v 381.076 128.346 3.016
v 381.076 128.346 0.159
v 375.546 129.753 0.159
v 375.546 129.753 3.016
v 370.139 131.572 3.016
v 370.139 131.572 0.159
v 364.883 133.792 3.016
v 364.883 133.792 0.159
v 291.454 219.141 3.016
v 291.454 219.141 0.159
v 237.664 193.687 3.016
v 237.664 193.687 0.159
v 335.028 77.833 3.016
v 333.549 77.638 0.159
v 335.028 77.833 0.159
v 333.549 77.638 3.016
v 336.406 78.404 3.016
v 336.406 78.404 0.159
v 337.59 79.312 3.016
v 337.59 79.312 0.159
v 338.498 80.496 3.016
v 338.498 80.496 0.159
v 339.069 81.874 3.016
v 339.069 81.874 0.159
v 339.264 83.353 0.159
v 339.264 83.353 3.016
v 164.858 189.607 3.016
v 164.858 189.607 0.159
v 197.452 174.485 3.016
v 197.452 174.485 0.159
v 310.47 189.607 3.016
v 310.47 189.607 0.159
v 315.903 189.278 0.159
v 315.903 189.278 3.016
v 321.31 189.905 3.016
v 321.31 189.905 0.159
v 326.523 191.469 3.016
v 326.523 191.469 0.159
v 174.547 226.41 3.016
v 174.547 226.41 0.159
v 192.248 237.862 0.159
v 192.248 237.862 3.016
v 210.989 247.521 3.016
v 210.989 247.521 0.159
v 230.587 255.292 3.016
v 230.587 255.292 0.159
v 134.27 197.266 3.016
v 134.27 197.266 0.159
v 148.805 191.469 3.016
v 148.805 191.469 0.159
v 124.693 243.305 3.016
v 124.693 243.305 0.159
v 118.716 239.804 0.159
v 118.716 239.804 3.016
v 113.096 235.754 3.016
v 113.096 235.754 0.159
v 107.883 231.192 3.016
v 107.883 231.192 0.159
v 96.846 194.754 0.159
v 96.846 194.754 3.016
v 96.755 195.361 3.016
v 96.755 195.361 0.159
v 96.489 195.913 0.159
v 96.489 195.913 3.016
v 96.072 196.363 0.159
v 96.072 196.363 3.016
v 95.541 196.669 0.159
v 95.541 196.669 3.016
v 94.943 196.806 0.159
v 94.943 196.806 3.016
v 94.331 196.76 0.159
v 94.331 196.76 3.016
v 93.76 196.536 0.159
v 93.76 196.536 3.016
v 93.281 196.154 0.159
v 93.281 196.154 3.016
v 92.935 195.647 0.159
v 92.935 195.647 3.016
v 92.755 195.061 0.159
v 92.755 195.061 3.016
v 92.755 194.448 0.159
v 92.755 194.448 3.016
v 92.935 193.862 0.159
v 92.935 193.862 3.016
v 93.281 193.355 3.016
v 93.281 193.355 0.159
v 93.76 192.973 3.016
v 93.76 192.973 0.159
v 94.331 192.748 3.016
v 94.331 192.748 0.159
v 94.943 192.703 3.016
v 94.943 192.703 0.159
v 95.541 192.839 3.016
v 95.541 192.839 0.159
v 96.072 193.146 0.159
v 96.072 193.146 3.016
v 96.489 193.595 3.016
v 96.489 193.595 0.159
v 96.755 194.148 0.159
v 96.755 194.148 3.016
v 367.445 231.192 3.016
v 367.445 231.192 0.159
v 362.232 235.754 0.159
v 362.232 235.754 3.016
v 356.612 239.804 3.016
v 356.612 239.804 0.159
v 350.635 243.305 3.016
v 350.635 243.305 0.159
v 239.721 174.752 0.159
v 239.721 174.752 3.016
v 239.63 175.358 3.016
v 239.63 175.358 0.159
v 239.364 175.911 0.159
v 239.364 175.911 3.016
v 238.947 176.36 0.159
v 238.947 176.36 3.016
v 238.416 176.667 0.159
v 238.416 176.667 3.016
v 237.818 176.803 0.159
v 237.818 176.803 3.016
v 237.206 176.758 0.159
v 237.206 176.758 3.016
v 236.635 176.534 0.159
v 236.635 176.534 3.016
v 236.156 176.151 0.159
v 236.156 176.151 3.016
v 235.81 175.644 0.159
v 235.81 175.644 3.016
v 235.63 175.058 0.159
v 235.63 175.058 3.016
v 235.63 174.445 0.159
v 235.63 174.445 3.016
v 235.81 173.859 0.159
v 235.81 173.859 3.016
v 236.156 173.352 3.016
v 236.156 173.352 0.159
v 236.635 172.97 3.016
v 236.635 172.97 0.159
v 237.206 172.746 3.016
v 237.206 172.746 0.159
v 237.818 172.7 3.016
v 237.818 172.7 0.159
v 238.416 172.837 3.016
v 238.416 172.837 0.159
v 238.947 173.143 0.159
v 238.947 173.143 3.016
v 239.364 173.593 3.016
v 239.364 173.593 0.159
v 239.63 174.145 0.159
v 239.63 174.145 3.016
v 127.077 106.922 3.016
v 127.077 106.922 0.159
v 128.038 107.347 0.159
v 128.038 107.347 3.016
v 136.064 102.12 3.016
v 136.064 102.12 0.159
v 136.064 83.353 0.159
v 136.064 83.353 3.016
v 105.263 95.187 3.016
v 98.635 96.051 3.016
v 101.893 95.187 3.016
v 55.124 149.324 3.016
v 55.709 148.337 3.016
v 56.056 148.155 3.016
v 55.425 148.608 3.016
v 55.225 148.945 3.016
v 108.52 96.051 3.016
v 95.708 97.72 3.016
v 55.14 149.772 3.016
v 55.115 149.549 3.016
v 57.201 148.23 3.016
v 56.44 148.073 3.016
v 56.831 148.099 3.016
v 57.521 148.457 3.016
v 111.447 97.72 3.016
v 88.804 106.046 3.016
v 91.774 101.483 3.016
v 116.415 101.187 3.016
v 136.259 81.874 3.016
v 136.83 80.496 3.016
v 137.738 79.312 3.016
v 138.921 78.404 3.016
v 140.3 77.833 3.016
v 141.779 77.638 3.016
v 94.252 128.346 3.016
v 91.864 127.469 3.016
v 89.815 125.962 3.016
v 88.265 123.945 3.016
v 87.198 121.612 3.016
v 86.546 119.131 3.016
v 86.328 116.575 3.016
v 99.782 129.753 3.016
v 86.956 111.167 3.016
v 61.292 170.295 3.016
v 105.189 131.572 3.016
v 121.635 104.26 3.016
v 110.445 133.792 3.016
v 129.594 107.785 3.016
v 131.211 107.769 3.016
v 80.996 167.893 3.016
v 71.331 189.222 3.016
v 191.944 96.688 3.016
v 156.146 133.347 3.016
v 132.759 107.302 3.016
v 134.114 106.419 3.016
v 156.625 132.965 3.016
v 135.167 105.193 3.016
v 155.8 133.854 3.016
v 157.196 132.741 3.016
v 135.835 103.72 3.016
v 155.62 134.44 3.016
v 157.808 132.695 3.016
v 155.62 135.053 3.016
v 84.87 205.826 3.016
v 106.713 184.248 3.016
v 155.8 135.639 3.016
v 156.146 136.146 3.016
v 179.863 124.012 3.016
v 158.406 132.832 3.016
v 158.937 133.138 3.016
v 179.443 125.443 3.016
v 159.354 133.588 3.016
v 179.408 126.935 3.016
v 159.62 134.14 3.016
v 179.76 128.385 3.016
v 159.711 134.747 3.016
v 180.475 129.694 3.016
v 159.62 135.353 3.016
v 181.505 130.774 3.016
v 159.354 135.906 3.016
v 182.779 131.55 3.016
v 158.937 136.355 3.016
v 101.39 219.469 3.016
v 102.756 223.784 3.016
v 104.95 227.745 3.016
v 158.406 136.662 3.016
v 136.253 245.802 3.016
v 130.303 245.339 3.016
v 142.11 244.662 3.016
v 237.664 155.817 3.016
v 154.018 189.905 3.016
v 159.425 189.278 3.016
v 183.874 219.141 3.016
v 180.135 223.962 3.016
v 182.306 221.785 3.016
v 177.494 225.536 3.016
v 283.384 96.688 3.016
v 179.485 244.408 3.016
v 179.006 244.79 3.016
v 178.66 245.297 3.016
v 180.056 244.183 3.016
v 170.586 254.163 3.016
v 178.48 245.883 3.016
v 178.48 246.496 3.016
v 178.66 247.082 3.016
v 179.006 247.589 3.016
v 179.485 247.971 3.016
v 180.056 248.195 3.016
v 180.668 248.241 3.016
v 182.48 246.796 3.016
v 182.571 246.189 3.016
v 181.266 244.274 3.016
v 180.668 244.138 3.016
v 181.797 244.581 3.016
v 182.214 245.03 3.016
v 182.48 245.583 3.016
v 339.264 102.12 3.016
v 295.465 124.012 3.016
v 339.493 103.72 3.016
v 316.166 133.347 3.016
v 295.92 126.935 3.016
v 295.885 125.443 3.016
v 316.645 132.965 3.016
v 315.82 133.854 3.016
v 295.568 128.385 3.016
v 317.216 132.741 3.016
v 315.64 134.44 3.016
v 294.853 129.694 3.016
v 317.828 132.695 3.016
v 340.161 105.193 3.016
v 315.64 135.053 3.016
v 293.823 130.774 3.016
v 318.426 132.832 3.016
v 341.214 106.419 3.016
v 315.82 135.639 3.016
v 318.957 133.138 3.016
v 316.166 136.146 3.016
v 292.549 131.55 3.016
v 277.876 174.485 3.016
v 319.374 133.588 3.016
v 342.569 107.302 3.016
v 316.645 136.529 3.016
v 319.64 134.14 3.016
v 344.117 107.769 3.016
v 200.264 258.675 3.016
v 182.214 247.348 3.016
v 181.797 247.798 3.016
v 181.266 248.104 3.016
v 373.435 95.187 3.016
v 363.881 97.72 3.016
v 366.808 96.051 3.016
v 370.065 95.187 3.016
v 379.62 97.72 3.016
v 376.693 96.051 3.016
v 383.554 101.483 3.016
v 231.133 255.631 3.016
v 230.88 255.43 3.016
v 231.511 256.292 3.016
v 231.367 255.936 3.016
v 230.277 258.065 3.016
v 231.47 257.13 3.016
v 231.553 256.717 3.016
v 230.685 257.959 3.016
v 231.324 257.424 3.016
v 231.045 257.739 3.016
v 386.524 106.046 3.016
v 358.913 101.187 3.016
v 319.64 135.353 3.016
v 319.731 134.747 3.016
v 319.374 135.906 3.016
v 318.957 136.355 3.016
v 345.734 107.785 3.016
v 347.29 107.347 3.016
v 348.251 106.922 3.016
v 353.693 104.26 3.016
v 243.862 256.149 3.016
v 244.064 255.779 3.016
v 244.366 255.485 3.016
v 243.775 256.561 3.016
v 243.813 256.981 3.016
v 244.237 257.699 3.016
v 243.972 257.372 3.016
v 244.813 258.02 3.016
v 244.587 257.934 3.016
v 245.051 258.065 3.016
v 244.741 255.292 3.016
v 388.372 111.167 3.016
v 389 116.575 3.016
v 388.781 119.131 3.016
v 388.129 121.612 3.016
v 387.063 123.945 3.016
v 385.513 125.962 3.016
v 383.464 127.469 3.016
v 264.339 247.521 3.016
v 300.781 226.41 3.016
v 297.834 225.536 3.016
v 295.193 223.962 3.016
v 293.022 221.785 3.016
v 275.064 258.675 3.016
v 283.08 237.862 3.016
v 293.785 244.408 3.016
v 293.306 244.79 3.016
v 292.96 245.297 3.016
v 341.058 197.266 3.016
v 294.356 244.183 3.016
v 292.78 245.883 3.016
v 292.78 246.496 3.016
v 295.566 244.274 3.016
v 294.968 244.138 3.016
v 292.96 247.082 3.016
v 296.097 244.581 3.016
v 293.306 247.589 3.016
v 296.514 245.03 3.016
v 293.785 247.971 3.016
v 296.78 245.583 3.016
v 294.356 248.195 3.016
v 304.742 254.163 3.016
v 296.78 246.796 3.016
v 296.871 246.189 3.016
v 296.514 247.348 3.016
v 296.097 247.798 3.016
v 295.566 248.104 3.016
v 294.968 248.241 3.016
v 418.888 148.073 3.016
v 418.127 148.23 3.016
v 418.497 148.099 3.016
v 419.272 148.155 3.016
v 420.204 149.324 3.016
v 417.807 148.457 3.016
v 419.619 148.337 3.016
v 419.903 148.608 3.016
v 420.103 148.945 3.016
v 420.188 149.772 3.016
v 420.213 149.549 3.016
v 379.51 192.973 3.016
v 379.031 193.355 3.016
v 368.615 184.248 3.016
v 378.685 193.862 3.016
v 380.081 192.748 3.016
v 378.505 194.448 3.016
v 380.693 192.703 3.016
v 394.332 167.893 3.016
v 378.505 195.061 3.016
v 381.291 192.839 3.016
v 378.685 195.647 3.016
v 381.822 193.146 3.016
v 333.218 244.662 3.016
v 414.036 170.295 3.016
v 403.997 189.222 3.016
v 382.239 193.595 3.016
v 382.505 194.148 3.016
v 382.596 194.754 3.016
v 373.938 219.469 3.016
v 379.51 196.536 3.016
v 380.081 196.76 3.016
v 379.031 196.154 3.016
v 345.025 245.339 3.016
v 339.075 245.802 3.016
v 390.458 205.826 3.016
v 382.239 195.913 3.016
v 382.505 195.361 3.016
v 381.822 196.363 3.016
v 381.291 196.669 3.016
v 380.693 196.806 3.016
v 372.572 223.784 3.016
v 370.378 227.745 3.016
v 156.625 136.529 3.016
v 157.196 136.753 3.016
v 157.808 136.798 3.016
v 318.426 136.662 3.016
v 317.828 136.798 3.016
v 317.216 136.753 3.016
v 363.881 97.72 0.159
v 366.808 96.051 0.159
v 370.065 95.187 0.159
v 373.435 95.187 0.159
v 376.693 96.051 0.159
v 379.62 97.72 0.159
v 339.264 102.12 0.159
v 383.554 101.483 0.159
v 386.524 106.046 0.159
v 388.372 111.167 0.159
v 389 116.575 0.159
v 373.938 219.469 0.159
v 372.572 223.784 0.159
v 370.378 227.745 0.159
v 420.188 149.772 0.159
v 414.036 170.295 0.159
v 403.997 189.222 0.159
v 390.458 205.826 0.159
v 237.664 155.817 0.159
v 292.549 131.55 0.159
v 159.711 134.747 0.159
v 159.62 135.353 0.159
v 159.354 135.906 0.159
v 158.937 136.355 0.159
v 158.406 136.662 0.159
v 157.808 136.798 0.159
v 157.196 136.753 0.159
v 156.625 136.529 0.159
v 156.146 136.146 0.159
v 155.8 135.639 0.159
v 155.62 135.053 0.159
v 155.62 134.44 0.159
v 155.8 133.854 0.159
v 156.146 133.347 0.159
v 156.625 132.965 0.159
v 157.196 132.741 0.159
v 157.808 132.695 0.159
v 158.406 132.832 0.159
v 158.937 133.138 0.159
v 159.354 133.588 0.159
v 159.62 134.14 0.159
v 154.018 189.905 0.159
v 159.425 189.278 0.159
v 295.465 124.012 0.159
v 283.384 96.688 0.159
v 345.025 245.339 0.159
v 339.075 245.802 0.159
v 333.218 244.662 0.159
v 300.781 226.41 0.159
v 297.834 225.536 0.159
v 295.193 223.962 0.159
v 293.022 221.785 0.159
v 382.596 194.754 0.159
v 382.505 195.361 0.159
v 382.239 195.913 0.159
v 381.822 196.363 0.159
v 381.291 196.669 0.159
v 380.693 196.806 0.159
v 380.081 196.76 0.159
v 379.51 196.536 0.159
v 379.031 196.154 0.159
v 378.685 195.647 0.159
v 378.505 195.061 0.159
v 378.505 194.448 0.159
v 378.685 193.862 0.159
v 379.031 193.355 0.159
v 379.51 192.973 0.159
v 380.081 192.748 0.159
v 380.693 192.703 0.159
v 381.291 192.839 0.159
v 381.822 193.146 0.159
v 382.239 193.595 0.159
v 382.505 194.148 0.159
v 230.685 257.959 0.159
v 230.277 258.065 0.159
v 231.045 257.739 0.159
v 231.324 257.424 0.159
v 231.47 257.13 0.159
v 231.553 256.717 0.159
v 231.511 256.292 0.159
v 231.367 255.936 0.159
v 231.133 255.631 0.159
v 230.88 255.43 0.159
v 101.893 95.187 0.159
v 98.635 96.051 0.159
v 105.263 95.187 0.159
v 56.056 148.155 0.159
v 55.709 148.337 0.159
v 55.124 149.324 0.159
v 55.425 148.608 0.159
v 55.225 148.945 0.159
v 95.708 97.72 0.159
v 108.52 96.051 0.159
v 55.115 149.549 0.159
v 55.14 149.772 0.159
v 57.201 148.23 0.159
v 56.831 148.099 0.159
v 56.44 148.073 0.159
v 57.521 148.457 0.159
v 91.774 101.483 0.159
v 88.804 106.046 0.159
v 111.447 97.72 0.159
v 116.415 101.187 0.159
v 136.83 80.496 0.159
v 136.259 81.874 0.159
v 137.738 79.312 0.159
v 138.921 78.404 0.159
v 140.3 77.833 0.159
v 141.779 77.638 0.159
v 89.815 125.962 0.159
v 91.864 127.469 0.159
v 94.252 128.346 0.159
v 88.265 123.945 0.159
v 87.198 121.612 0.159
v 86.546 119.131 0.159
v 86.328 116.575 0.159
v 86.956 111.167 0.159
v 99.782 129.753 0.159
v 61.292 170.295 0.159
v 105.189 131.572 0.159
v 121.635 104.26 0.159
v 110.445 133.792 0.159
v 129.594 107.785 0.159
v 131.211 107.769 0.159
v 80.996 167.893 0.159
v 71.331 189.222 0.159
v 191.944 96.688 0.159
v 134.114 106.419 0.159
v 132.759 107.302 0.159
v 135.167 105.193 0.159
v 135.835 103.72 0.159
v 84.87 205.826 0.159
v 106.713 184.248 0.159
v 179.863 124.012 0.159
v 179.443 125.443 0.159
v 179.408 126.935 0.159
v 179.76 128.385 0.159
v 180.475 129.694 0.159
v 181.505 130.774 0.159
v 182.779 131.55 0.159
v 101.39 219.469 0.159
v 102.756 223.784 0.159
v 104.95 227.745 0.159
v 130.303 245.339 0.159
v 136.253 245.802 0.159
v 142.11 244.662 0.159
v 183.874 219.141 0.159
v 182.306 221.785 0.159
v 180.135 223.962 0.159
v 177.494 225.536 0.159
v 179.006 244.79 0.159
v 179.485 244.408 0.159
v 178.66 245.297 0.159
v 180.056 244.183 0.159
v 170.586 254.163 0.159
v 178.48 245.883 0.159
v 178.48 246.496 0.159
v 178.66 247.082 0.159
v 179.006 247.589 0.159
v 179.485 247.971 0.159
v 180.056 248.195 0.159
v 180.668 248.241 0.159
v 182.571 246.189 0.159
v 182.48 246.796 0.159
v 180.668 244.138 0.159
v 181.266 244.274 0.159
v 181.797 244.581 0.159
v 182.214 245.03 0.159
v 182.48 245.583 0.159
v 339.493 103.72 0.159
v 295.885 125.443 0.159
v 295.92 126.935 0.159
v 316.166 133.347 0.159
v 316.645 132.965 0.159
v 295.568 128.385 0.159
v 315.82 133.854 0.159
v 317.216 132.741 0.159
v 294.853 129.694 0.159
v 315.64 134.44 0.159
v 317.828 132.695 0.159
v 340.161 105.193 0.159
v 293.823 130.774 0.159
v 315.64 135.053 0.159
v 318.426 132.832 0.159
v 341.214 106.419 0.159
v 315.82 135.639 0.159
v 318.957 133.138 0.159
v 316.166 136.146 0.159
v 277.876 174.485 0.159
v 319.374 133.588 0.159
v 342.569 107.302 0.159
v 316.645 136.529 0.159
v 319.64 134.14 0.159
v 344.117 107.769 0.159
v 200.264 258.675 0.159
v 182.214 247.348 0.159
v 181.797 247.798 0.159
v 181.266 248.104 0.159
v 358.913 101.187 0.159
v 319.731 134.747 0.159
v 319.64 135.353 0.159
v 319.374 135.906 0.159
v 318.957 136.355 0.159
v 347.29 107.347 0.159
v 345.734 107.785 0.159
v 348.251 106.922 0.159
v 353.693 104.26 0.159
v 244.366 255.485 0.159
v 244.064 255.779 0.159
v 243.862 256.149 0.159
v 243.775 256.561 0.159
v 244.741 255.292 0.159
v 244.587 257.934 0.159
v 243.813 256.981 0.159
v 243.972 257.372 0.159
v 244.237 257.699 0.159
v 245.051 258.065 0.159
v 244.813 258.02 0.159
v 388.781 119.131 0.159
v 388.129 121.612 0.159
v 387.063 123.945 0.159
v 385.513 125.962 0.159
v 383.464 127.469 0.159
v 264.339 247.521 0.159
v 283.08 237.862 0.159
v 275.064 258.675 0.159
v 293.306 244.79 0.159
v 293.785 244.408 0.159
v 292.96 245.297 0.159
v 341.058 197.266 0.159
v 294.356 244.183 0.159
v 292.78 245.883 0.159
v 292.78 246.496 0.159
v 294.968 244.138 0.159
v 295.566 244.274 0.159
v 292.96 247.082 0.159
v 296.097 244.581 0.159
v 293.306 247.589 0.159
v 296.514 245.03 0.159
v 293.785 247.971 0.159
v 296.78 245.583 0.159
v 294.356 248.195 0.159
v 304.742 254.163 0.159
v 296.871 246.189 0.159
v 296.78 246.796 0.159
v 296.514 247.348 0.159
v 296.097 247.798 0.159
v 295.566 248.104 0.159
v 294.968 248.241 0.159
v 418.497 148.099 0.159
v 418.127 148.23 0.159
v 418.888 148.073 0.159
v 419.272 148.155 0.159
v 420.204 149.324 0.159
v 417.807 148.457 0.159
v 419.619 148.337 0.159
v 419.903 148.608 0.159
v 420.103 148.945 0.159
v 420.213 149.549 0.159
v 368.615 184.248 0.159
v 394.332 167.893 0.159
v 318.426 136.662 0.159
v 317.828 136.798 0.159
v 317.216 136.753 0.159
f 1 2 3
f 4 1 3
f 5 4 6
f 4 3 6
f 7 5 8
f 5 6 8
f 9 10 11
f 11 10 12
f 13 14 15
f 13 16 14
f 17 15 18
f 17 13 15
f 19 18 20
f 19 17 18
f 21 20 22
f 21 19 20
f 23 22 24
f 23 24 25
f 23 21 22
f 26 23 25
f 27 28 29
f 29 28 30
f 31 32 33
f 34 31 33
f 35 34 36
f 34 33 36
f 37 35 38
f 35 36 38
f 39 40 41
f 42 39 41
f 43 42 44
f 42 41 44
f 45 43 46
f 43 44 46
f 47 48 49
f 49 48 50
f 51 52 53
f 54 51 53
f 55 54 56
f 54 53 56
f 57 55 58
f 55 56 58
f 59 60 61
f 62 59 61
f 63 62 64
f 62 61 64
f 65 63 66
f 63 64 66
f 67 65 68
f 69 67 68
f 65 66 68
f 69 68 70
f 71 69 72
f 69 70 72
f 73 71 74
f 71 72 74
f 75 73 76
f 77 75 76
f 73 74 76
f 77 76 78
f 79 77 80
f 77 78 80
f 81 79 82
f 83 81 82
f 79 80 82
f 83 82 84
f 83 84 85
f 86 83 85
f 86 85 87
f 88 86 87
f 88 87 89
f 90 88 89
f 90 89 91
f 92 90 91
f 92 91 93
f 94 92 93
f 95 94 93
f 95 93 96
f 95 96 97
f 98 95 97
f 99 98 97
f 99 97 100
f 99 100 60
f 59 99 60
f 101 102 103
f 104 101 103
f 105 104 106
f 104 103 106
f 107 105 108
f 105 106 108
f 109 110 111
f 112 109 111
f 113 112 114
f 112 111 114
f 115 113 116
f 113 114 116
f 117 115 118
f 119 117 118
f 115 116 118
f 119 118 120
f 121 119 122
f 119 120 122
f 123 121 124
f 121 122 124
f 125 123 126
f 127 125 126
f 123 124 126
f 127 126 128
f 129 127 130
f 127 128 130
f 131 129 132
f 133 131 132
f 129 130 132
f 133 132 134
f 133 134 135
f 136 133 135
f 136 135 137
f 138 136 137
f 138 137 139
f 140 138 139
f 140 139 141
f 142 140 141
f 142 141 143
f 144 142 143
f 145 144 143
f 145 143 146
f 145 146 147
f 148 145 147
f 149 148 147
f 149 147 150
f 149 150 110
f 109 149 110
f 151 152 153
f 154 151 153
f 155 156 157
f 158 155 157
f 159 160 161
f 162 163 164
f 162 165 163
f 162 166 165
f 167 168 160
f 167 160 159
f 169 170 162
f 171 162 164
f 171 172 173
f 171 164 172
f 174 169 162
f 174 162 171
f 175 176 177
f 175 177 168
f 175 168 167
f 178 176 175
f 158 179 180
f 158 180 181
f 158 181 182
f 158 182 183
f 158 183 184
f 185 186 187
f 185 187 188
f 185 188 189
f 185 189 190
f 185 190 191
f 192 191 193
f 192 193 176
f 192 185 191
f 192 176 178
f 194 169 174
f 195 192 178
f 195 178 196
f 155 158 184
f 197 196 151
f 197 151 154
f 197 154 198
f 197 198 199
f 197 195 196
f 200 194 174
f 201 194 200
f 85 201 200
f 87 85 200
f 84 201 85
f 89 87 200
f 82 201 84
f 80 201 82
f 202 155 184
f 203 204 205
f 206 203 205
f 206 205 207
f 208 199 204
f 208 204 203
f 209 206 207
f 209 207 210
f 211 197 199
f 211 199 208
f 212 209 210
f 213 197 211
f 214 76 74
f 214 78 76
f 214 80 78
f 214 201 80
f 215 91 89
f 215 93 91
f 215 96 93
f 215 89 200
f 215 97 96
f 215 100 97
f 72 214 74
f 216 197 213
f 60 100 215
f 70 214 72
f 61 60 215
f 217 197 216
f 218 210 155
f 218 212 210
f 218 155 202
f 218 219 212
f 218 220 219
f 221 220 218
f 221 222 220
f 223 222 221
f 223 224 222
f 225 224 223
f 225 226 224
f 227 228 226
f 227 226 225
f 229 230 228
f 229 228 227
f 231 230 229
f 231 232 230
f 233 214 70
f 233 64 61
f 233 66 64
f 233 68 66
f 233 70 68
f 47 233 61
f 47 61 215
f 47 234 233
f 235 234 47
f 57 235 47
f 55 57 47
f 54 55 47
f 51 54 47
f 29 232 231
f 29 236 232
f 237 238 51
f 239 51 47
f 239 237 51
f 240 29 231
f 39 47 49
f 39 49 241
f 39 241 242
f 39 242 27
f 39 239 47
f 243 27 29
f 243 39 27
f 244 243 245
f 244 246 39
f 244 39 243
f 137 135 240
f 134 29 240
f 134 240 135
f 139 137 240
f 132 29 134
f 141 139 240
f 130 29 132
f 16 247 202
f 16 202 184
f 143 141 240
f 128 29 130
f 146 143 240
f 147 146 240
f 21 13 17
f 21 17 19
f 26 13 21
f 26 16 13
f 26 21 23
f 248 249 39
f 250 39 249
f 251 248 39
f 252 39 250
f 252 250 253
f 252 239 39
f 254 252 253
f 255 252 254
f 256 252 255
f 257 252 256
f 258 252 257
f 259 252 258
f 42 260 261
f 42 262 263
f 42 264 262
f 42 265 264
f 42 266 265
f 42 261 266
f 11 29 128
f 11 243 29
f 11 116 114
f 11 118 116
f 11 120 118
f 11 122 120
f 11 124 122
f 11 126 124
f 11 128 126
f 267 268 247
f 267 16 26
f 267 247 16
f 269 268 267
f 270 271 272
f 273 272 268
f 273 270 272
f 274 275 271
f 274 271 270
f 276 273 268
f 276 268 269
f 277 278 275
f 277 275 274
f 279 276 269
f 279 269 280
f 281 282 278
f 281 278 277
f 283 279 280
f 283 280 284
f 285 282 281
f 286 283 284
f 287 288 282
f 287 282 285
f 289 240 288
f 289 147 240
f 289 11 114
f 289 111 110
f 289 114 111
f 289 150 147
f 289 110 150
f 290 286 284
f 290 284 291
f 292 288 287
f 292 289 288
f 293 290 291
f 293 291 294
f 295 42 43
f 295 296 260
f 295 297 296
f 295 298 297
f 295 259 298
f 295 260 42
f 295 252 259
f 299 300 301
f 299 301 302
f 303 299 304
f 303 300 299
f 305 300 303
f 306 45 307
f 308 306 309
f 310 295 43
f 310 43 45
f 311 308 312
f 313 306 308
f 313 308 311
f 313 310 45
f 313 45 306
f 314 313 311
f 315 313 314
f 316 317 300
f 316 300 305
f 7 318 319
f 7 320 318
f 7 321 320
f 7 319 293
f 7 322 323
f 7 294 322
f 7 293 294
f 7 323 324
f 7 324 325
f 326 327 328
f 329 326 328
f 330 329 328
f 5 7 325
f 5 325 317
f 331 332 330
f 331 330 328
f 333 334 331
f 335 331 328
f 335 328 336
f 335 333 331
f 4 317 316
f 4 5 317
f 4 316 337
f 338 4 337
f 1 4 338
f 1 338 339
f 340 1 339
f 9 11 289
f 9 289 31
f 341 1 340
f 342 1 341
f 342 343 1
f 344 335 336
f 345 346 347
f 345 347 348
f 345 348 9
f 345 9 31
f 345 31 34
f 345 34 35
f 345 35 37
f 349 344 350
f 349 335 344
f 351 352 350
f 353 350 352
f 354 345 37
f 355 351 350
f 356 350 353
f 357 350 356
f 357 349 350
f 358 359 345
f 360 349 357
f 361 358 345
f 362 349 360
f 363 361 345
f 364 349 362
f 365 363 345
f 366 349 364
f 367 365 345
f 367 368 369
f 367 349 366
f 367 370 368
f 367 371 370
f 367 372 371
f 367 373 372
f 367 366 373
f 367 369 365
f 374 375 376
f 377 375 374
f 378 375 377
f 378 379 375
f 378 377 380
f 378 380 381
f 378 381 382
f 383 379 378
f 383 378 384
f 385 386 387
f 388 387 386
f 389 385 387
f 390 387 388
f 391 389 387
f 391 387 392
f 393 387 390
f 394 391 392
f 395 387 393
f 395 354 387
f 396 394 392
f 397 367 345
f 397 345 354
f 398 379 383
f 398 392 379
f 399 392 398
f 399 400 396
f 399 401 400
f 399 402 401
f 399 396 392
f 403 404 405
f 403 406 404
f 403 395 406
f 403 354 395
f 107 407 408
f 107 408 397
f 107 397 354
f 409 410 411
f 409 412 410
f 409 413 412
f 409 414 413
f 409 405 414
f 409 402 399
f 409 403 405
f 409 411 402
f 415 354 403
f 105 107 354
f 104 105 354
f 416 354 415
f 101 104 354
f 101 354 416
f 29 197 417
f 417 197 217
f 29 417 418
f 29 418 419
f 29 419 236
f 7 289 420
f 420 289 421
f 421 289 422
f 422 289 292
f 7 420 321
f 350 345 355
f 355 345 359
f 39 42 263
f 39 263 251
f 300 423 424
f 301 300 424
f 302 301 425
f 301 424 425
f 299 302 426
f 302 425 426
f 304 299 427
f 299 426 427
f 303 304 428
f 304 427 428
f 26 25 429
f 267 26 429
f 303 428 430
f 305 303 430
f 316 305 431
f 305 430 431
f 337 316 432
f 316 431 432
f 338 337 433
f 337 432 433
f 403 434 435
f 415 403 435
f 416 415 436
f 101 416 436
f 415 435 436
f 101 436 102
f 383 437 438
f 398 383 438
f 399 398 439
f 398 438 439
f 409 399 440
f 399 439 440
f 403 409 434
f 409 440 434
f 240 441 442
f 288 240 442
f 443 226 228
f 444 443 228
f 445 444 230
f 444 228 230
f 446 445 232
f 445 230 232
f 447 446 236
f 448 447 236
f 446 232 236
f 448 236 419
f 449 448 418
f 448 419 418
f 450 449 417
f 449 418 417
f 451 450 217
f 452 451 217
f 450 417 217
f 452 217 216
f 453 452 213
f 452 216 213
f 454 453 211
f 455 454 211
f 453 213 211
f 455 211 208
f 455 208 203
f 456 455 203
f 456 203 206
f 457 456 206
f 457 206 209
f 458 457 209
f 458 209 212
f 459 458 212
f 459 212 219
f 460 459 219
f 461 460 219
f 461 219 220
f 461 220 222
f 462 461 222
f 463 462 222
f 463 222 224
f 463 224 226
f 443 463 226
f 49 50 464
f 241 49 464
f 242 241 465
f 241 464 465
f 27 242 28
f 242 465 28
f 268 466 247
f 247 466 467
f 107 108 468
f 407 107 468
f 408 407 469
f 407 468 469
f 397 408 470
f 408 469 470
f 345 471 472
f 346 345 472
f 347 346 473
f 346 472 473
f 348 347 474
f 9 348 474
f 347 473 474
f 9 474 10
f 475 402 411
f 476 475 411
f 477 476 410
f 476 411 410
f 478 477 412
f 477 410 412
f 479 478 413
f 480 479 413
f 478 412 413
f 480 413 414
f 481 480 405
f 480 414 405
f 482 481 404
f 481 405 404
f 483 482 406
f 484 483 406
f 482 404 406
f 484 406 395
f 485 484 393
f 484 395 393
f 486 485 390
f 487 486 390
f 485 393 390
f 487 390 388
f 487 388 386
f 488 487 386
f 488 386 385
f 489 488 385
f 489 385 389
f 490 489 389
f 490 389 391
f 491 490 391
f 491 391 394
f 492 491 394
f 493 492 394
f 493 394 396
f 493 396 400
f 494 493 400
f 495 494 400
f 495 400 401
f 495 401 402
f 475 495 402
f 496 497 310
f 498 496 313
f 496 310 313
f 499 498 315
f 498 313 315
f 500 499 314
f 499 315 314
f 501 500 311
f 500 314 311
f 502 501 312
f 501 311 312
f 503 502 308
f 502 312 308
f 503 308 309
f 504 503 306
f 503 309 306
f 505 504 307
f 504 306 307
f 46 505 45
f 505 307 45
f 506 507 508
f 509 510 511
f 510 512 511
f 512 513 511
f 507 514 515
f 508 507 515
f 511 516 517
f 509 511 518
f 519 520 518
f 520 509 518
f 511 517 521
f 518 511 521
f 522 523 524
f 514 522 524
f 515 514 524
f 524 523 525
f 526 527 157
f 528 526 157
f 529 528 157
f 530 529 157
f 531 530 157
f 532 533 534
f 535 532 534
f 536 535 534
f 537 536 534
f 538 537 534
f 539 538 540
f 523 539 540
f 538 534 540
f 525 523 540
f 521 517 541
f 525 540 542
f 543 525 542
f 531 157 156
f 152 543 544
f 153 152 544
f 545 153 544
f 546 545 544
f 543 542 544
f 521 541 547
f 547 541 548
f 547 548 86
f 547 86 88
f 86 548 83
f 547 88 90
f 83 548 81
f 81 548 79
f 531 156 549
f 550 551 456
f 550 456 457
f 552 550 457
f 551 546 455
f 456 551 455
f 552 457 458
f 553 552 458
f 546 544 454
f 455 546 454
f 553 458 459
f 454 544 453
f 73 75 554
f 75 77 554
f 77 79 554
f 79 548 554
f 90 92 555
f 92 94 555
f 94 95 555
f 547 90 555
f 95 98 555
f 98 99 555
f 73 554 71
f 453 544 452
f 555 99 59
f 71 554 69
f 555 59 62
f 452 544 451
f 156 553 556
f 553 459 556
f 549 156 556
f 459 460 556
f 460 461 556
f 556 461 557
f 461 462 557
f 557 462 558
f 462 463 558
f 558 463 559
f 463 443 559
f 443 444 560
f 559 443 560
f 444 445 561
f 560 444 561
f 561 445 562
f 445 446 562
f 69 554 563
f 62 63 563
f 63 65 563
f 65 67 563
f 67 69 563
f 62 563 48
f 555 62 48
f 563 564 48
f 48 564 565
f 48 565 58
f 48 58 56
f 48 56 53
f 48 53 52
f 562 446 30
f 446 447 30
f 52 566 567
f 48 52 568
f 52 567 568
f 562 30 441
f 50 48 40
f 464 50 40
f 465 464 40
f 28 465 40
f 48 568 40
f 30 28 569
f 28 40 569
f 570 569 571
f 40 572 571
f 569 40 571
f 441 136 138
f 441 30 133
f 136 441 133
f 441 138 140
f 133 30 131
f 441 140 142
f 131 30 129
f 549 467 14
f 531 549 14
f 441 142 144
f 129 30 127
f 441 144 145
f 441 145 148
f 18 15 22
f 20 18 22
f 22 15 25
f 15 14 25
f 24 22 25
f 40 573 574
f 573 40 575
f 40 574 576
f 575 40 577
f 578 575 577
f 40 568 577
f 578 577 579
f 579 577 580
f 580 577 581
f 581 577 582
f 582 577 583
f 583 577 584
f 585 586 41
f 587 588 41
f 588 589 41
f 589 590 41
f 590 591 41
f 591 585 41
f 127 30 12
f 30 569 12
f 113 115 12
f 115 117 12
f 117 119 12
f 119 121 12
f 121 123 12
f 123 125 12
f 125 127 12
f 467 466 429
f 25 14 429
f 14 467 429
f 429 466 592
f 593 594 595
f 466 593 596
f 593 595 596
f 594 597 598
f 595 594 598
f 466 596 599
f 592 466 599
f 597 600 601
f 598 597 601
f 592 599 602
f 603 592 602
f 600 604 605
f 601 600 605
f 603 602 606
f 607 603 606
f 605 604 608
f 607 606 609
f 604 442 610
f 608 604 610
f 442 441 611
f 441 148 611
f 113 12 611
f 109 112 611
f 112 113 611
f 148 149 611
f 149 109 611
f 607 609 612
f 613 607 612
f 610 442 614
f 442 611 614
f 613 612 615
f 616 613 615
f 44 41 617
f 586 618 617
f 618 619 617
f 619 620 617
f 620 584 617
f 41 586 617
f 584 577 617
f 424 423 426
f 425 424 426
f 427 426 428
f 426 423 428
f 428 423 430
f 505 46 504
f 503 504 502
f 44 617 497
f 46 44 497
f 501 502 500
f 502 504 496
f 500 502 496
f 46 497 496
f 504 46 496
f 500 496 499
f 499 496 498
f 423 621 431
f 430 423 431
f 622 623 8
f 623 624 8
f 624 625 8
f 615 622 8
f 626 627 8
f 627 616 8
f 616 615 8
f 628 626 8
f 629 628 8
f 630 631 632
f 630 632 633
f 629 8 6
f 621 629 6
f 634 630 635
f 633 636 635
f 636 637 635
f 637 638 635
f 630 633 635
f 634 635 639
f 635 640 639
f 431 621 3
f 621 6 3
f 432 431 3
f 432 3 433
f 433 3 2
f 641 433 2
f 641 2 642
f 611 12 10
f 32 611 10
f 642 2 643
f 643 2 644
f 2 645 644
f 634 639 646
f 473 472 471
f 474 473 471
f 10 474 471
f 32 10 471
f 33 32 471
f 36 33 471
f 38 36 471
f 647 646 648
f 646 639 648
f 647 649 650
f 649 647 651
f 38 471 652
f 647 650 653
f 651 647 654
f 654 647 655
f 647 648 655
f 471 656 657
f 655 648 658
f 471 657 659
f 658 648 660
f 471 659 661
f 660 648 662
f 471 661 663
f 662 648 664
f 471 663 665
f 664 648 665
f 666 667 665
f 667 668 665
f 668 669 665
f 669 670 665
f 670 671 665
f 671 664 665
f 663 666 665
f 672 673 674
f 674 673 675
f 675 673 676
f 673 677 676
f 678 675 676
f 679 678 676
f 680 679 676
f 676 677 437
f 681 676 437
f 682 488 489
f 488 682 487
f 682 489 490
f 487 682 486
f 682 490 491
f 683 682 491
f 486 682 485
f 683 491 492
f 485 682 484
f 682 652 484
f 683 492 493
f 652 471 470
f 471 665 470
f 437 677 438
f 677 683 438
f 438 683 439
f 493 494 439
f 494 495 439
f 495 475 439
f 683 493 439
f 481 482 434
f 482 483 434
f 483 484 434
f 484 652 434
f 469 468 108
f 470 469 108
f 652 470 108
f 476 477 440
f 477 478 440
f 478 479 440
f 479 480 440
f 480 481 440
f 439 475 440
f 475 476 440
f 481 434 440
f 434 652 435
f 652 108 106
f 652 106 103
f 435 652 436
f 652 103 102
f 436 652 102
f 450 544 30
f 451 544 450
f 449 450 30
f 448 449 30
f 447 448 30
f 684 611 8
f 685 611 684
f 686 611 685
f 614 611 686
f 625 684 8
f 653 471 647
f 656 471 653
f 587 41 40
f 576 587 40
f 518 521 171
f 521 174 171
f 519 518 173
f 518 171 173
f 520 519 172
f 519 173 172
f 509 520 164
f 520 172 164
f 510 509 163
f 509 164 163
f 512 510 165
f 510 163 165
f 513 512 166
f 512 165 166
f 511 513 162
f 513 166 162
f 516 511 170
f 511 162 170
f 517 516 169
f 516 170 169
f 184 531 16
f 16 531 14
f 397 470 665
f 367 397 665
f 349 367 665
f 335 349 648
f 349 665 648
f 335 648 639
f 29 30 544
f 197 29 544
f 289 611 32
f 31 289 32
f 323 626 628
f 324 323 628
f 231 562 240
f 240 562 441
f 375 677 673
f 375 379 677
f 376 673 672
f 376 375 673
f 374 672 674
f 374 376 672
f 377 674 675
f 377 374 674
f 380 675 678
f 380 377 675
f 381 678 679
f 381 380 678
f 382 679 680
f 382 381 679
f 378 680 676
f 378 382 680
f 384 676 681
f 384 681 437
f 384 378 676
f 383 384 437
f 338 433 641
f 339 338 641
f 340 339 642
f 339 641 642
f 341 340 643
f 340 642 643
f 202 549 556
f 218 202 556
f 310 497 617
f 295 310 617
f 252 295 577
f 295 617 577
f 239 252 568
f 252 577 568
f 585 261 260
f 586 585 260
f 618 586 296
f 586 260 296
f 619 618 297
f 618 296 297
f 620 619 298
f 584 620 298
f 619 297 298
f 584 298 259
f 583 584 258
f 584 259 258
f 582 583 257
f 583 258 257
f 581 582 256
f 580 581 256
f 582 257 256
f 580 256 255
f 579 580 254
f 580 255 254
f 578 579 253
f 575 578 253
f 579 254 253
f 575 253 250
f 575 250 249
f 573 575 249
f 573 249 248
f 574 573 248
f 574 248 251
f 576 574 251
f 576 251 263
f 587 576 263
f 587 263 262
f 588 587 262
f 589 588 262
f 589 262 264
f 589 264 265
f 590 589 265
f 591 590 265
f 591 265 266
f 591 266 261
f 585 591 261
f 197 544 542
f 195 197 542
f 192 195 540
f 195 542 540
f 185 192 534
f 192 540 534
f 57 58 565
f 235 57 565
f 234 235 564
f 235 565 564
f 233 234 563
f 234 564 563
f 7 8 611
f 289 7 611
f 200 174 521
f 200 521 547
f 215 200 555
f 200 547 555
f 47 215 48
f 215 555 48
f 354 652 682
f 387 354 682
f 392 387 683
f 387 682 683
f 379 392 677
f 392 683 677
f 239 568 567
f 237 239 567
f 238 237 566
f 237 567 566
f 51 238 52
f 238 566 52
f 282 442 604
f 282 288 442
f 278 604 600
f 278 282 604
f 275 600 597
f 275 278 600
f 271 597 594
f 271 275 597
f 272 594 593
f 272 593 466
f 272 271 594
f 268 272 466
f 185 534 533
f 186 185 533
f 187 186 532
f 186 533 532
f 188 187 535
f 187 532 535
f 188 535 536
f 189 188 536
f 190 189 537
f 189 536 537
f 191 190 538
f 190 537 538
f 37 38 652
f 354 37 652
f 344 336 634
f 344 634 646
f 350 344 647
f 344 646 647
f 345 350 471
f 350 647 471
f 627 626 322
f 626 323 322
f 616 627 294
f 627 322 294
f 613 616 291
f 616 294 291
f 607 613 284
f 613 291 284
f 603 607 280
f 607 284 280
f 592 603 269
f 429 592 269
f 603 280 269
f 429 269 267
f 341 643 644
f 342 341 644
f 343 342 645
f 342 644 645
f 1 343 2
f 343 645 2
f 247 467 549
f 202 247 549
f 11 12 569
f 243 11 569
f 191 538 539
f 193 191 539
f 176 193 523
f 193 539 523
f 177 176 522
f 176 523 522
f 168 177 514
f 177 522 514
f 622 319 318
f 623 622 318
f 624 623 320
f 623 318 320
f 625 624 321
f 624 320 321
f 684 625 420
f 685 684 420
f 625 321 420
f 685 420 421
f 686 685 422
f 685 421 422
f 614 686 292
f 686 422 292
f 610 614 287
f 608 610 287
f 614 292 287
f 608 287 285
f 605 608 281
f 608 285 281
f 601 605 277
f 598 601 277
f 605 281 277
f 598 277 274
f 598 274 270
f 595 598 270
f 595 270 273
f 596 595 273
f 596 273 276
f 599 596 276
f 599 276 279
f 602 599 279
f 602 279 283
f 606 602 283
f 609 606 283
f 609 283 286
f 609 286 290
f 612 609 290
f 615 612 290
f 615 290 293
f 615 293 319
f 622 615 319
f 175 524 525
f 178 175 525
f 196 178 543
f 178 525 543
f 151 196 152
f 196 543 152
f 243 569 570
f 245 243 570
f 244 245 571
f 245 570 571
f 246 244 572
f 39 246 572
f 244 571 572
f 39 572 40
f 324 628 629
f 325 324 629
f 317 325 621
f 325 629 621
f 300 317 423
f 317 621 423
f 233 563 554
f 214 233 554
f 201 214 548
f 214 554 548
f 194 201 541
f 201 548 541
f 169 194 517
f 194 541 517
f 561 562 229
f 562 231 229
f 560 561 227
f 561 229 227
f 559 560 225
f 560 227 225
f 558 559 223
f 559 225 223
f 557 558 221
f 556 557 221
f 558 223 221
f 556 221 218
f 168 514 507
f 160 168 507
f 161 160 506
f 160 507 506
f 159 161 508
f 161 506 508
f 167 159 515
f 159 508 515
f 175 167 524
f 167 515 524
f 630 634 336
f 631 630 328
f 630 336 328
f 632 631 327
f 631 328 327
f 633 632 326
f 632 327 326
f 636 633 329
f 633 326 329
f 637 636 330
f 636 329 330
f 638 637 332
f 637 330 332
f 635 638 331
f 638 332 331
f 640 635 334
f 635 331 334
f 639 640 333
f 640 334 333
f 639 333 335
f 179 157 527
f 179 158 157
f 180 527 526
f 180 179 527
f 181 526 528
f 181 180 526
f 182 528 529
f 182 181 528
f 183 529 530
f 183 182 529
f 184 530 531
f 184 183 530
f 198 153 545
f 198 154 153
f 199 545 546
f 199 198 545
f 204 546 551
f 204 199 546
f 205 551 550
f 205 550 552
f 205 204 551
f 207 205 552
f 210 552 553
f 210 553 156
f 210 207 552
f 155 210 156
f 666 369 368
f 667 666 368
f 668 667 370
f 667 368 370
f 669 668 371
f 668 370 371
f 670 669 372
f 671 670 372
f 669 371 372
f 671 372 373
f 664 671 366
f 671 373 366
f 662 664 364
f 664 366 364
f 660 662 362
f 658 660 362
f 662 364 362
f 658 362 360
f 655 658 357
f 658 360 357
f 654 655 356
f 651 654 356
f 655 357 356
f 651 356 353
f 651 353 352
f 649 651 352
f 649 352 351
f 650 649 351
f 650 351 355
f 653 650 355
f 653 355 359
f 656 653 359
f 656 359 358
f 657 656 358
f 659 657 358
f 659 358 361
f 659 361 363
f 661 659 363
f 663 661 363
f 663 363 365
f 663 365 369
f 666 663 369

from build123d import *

# Parameters (mm, degrees)
BOSS_EXTRUDE1_DEPTH = 3.175
BOSS_EXTRUDE2_DEPTH = 3.175
FILLET1_R           = 6.35
SKETCH3_R           = 2.286
CUT_EXTRUDE1_DEPTH  = 518.046822543
FILLET2_R           = 1.5875
SCALE4_SCALE        = 0.9


with BuildPart() as part:
    # Sketch1 → Boss-Extrude1 (new body)
    with BuildSketch(Plane.XY):
        with BuildLine():
            Line((192.983759728, 175.441215803), (96.309561297, 130.227436844))
            ThreePointArc((96.309561297, 130.227436844), (87.484677999, 126.692854878), (78.317465574, 124.176100766))
            ThreePointArc((78.317465574, 124.176100766), (74.466708454, 122.444126875), (71.664680309, 119.285535064))
            ThreePointArc((71.664680309, 119.285535064), (70.058699462, 115.330377605), (69.512486748, 111.096691661))
            ThreePointArc((69.512486748, 111.096691661), (72.264254662, 99.39829615), (79.935173725, 90.147259184))
            ThreePointArc((79.935173725, 90.147259184), (88.679137799, 87.2113543), (97.423101873, 90.147259184))
            ThreePointArc((97.423101873, 90.147259184), (105.809954176, 95.76246485), (114.789367372, 100.371148488))
            Line((114.789367372, 100.371148488), (237.663968602, 154.698817321))
            Line((237.663968602, 154.698817321), (360.538569833, 100.371148488))
            ThreePointArc((360.538569833, 100.371148488), (369.517983029, 95.76246485), (377.904835332, 90.147259184))
            ThreePointArc((377.904835332, 90.147259184), (386.648799405, 87.2113543), (395.392763479, 90.147259184))
            ThreePointArc((395.392763479, 90.147259184), (403.063682542, 99.39829615), (405.815450457, 111.096691661))
            ThreePointArc((405.815450457, 111.096691661), (405.269237742, 115.330377605), (403.663256896, 119.285535064))
            ThreePointArc((403.663256896, 119.285535064), (400.86122875, 122.444126875), (397.01047163, 124.176100766))
            ThreePointArc((397.01047163, 124.176100766), (387.843259205, 126.692854878), (379.018375907, 130.227436844))
            Line((379.018375907, 130.227436844), (282.344177476, 175.441215803))
            Line((282.344177476, 175.441215803), (318.55970852, 192.243538611))
            ThreePointArc((318.55970852, 192.243538611), (327.615304884, 192.094216272), (336.396188974, 194.312818822))
            Line((336.396188974, 194.312818822), (352.546314681, 200.753440043))
            ThreePointArc((352.546314681, 200.753440043), (399.763650832, 176.34843342), (441.305300897, 143.191646915))
            ThreePointArc((441.305300897, 143.191646915), (423.803151272, 189.77617727), (389.079447428, 225.423170147))
            ThreePointArc((389.079447428, 225.423170147), (386.452648862, 232.479391977), (381.864833782, 238.449508393))
            ThreePointArc((381.864833782, 238.449508393), (373.00378877, 245.841981415), (363.187253088, 251.908479853))
            ThreePointArc((363.187253088, 251.908479853), (353.665803765, 254.648371797), (343.834991341, 253.415435392))
            ThreePointArc((343.834991341, 253.415435392), (292.266671735, 267.690958579), (238.759580195, 267.420211094))
            ThreePointArc((238.759580195, 267.420211094), (274.672718132, 253.0886387), (307.794144835, 233.135730718))
            ThreePointArc((307.794144835, 233.135730718), (301.585446406, 230.415438718), (297.431026809, 225.059253268))
            Line((297.431026809, 225.059253268), (237.663968602, 196.776891326))
            Line((237.663968602, 196.776891326), (177.896910395, 225.059253268))
            ThreePointArc((177.896910395, 225.059253268), (173.742490798, 230.415438718), (167.533792369, 233.135730718))
            ThreePointArc((167.533792369, 233.135730718), (200.655219072, 253.0886387), (236.568357009, 267.420211094))
            ThreePointArc((236.568357009, 267.420211094), (183.061265469, 267.690958579), (131.492945863, 253.415435392))
            ThreePointArc((131.492945863, 253.415435392), (121.66213344, 254.648371797), (112.140684116, 251.908479853))
            ThreePointArc((112.140684116, 251.908479853), (102.324148434, 245.841981415), (93.463103422, 238.449508393))
            ThreePointArc((93.463103422, 238.449508393), (88.875288342, 232.479391977), (86.248489776, 225.423170147))
            ThreePointArc((86.248489776, 225.423170147), (51.524785932, 189.77617727), (34.022636308, 143.191646915))
            ThreePointArc((34.022636308, 143.191646915), (75.564286372, 176.34843342), (122.781622523, 200.753440043))
            Line((122.781622523, 200.753440043), (138.931748231, 194.312818822))
            ThreePointArc((138.931748231, 194.312818822), (147.712632321, 192.094216272), (156.768228685, 192.243538611))
            Line((156.768228685, 192.243538611), (192.983759728, 175.441215803))
        make_face()
    extrude(amount=BOSS_EXTRUDE1_DEPTH)

    # Sketch2 → Boss-Extrude2 (add)
    with BuildSketch(Plane.XY):
        Polygon((124.775079826, 104.786222668), (124.775079826, 67.83365331), (350.552857378, 67.83365331), (350.552857378, 104.786222668), (304.455055516, 125.167864508), (288.463968602, 89.00031913), (186.863968602, 89.00031913), (170.872881688, 125.167864508), align=None)
    extrude(amount=BOSS_EXTRUDE2_DEPTH)

    # Fillet1
    fillet1_edges = [part.edges().sort_by_distance(p)[0] for p in [
        (304.455055516, 125.167864508, 1.5875),
        (350.552857378, 104.786222668, 1.5875),
        (350.552857378, 67.83365331, 1.5875),
        (124.775079826, 67.83365331, 1.5875),
        (124.775079826, 104.786222668, 1.5875),
        (170.872881688, 125.167864508, 1.5875),
    ]]
    fillet(fillet1_edges, radius=FILLET1_R)

    # Sketch3 → Cut-Extrude1 (cut, through all)
    with BuildSketch(Plane.XY.offset(3.175)):
        with Locations((237.663968602, 175.737854324)):
            Circle(SKETCH3_R)
        with Locations((78.913968602, 197.962854324)):
            Circle(SKETCH3_R)
        with Locations((174.163968602, 255.112854324)):
            Circle(SKETCH3_R)
        with Locations((301.163968602, 255.112854324)):
            Circle(SKETCH3_R)
        with Locations((396.413968602, 197.962854324)):
            Circle(SKETCH3_R)
        with Locations((148.763968602, 131.287854324)):
            Circle(SKETCH3_R)
        with Locations((326.563968602, 131.287854324)):
            Circle(SKETCH3_R)
    extrude(amount=-CUT_EXTRUDE1_DEPTH, mode=Mode.SUBTRACT)

    # Fillet2
    fillet2_edges = [part.edges().sort_by_distance(p)[0] for p in [
        (34.022636308, 143.191646915, 1.5875),
        (236.568357009, 267.420211094, 1.5875),
        (238.759580195, 267.420211094, 1.5875),
        (441.305300897, 143.191646915, 1.5875),
    ]]
    fillet(fillet2_edges, radius=FILLET2_R)


with BuildPart() as part_1:
    # Scale4: scaled about (237.663968386, 165.877309559, 1.5875)
    add(part.part.scale(SCALE4_SCALE).moved(Location((23.766396839, 16.587730956, 0.15875))))


solid = part_1.part
